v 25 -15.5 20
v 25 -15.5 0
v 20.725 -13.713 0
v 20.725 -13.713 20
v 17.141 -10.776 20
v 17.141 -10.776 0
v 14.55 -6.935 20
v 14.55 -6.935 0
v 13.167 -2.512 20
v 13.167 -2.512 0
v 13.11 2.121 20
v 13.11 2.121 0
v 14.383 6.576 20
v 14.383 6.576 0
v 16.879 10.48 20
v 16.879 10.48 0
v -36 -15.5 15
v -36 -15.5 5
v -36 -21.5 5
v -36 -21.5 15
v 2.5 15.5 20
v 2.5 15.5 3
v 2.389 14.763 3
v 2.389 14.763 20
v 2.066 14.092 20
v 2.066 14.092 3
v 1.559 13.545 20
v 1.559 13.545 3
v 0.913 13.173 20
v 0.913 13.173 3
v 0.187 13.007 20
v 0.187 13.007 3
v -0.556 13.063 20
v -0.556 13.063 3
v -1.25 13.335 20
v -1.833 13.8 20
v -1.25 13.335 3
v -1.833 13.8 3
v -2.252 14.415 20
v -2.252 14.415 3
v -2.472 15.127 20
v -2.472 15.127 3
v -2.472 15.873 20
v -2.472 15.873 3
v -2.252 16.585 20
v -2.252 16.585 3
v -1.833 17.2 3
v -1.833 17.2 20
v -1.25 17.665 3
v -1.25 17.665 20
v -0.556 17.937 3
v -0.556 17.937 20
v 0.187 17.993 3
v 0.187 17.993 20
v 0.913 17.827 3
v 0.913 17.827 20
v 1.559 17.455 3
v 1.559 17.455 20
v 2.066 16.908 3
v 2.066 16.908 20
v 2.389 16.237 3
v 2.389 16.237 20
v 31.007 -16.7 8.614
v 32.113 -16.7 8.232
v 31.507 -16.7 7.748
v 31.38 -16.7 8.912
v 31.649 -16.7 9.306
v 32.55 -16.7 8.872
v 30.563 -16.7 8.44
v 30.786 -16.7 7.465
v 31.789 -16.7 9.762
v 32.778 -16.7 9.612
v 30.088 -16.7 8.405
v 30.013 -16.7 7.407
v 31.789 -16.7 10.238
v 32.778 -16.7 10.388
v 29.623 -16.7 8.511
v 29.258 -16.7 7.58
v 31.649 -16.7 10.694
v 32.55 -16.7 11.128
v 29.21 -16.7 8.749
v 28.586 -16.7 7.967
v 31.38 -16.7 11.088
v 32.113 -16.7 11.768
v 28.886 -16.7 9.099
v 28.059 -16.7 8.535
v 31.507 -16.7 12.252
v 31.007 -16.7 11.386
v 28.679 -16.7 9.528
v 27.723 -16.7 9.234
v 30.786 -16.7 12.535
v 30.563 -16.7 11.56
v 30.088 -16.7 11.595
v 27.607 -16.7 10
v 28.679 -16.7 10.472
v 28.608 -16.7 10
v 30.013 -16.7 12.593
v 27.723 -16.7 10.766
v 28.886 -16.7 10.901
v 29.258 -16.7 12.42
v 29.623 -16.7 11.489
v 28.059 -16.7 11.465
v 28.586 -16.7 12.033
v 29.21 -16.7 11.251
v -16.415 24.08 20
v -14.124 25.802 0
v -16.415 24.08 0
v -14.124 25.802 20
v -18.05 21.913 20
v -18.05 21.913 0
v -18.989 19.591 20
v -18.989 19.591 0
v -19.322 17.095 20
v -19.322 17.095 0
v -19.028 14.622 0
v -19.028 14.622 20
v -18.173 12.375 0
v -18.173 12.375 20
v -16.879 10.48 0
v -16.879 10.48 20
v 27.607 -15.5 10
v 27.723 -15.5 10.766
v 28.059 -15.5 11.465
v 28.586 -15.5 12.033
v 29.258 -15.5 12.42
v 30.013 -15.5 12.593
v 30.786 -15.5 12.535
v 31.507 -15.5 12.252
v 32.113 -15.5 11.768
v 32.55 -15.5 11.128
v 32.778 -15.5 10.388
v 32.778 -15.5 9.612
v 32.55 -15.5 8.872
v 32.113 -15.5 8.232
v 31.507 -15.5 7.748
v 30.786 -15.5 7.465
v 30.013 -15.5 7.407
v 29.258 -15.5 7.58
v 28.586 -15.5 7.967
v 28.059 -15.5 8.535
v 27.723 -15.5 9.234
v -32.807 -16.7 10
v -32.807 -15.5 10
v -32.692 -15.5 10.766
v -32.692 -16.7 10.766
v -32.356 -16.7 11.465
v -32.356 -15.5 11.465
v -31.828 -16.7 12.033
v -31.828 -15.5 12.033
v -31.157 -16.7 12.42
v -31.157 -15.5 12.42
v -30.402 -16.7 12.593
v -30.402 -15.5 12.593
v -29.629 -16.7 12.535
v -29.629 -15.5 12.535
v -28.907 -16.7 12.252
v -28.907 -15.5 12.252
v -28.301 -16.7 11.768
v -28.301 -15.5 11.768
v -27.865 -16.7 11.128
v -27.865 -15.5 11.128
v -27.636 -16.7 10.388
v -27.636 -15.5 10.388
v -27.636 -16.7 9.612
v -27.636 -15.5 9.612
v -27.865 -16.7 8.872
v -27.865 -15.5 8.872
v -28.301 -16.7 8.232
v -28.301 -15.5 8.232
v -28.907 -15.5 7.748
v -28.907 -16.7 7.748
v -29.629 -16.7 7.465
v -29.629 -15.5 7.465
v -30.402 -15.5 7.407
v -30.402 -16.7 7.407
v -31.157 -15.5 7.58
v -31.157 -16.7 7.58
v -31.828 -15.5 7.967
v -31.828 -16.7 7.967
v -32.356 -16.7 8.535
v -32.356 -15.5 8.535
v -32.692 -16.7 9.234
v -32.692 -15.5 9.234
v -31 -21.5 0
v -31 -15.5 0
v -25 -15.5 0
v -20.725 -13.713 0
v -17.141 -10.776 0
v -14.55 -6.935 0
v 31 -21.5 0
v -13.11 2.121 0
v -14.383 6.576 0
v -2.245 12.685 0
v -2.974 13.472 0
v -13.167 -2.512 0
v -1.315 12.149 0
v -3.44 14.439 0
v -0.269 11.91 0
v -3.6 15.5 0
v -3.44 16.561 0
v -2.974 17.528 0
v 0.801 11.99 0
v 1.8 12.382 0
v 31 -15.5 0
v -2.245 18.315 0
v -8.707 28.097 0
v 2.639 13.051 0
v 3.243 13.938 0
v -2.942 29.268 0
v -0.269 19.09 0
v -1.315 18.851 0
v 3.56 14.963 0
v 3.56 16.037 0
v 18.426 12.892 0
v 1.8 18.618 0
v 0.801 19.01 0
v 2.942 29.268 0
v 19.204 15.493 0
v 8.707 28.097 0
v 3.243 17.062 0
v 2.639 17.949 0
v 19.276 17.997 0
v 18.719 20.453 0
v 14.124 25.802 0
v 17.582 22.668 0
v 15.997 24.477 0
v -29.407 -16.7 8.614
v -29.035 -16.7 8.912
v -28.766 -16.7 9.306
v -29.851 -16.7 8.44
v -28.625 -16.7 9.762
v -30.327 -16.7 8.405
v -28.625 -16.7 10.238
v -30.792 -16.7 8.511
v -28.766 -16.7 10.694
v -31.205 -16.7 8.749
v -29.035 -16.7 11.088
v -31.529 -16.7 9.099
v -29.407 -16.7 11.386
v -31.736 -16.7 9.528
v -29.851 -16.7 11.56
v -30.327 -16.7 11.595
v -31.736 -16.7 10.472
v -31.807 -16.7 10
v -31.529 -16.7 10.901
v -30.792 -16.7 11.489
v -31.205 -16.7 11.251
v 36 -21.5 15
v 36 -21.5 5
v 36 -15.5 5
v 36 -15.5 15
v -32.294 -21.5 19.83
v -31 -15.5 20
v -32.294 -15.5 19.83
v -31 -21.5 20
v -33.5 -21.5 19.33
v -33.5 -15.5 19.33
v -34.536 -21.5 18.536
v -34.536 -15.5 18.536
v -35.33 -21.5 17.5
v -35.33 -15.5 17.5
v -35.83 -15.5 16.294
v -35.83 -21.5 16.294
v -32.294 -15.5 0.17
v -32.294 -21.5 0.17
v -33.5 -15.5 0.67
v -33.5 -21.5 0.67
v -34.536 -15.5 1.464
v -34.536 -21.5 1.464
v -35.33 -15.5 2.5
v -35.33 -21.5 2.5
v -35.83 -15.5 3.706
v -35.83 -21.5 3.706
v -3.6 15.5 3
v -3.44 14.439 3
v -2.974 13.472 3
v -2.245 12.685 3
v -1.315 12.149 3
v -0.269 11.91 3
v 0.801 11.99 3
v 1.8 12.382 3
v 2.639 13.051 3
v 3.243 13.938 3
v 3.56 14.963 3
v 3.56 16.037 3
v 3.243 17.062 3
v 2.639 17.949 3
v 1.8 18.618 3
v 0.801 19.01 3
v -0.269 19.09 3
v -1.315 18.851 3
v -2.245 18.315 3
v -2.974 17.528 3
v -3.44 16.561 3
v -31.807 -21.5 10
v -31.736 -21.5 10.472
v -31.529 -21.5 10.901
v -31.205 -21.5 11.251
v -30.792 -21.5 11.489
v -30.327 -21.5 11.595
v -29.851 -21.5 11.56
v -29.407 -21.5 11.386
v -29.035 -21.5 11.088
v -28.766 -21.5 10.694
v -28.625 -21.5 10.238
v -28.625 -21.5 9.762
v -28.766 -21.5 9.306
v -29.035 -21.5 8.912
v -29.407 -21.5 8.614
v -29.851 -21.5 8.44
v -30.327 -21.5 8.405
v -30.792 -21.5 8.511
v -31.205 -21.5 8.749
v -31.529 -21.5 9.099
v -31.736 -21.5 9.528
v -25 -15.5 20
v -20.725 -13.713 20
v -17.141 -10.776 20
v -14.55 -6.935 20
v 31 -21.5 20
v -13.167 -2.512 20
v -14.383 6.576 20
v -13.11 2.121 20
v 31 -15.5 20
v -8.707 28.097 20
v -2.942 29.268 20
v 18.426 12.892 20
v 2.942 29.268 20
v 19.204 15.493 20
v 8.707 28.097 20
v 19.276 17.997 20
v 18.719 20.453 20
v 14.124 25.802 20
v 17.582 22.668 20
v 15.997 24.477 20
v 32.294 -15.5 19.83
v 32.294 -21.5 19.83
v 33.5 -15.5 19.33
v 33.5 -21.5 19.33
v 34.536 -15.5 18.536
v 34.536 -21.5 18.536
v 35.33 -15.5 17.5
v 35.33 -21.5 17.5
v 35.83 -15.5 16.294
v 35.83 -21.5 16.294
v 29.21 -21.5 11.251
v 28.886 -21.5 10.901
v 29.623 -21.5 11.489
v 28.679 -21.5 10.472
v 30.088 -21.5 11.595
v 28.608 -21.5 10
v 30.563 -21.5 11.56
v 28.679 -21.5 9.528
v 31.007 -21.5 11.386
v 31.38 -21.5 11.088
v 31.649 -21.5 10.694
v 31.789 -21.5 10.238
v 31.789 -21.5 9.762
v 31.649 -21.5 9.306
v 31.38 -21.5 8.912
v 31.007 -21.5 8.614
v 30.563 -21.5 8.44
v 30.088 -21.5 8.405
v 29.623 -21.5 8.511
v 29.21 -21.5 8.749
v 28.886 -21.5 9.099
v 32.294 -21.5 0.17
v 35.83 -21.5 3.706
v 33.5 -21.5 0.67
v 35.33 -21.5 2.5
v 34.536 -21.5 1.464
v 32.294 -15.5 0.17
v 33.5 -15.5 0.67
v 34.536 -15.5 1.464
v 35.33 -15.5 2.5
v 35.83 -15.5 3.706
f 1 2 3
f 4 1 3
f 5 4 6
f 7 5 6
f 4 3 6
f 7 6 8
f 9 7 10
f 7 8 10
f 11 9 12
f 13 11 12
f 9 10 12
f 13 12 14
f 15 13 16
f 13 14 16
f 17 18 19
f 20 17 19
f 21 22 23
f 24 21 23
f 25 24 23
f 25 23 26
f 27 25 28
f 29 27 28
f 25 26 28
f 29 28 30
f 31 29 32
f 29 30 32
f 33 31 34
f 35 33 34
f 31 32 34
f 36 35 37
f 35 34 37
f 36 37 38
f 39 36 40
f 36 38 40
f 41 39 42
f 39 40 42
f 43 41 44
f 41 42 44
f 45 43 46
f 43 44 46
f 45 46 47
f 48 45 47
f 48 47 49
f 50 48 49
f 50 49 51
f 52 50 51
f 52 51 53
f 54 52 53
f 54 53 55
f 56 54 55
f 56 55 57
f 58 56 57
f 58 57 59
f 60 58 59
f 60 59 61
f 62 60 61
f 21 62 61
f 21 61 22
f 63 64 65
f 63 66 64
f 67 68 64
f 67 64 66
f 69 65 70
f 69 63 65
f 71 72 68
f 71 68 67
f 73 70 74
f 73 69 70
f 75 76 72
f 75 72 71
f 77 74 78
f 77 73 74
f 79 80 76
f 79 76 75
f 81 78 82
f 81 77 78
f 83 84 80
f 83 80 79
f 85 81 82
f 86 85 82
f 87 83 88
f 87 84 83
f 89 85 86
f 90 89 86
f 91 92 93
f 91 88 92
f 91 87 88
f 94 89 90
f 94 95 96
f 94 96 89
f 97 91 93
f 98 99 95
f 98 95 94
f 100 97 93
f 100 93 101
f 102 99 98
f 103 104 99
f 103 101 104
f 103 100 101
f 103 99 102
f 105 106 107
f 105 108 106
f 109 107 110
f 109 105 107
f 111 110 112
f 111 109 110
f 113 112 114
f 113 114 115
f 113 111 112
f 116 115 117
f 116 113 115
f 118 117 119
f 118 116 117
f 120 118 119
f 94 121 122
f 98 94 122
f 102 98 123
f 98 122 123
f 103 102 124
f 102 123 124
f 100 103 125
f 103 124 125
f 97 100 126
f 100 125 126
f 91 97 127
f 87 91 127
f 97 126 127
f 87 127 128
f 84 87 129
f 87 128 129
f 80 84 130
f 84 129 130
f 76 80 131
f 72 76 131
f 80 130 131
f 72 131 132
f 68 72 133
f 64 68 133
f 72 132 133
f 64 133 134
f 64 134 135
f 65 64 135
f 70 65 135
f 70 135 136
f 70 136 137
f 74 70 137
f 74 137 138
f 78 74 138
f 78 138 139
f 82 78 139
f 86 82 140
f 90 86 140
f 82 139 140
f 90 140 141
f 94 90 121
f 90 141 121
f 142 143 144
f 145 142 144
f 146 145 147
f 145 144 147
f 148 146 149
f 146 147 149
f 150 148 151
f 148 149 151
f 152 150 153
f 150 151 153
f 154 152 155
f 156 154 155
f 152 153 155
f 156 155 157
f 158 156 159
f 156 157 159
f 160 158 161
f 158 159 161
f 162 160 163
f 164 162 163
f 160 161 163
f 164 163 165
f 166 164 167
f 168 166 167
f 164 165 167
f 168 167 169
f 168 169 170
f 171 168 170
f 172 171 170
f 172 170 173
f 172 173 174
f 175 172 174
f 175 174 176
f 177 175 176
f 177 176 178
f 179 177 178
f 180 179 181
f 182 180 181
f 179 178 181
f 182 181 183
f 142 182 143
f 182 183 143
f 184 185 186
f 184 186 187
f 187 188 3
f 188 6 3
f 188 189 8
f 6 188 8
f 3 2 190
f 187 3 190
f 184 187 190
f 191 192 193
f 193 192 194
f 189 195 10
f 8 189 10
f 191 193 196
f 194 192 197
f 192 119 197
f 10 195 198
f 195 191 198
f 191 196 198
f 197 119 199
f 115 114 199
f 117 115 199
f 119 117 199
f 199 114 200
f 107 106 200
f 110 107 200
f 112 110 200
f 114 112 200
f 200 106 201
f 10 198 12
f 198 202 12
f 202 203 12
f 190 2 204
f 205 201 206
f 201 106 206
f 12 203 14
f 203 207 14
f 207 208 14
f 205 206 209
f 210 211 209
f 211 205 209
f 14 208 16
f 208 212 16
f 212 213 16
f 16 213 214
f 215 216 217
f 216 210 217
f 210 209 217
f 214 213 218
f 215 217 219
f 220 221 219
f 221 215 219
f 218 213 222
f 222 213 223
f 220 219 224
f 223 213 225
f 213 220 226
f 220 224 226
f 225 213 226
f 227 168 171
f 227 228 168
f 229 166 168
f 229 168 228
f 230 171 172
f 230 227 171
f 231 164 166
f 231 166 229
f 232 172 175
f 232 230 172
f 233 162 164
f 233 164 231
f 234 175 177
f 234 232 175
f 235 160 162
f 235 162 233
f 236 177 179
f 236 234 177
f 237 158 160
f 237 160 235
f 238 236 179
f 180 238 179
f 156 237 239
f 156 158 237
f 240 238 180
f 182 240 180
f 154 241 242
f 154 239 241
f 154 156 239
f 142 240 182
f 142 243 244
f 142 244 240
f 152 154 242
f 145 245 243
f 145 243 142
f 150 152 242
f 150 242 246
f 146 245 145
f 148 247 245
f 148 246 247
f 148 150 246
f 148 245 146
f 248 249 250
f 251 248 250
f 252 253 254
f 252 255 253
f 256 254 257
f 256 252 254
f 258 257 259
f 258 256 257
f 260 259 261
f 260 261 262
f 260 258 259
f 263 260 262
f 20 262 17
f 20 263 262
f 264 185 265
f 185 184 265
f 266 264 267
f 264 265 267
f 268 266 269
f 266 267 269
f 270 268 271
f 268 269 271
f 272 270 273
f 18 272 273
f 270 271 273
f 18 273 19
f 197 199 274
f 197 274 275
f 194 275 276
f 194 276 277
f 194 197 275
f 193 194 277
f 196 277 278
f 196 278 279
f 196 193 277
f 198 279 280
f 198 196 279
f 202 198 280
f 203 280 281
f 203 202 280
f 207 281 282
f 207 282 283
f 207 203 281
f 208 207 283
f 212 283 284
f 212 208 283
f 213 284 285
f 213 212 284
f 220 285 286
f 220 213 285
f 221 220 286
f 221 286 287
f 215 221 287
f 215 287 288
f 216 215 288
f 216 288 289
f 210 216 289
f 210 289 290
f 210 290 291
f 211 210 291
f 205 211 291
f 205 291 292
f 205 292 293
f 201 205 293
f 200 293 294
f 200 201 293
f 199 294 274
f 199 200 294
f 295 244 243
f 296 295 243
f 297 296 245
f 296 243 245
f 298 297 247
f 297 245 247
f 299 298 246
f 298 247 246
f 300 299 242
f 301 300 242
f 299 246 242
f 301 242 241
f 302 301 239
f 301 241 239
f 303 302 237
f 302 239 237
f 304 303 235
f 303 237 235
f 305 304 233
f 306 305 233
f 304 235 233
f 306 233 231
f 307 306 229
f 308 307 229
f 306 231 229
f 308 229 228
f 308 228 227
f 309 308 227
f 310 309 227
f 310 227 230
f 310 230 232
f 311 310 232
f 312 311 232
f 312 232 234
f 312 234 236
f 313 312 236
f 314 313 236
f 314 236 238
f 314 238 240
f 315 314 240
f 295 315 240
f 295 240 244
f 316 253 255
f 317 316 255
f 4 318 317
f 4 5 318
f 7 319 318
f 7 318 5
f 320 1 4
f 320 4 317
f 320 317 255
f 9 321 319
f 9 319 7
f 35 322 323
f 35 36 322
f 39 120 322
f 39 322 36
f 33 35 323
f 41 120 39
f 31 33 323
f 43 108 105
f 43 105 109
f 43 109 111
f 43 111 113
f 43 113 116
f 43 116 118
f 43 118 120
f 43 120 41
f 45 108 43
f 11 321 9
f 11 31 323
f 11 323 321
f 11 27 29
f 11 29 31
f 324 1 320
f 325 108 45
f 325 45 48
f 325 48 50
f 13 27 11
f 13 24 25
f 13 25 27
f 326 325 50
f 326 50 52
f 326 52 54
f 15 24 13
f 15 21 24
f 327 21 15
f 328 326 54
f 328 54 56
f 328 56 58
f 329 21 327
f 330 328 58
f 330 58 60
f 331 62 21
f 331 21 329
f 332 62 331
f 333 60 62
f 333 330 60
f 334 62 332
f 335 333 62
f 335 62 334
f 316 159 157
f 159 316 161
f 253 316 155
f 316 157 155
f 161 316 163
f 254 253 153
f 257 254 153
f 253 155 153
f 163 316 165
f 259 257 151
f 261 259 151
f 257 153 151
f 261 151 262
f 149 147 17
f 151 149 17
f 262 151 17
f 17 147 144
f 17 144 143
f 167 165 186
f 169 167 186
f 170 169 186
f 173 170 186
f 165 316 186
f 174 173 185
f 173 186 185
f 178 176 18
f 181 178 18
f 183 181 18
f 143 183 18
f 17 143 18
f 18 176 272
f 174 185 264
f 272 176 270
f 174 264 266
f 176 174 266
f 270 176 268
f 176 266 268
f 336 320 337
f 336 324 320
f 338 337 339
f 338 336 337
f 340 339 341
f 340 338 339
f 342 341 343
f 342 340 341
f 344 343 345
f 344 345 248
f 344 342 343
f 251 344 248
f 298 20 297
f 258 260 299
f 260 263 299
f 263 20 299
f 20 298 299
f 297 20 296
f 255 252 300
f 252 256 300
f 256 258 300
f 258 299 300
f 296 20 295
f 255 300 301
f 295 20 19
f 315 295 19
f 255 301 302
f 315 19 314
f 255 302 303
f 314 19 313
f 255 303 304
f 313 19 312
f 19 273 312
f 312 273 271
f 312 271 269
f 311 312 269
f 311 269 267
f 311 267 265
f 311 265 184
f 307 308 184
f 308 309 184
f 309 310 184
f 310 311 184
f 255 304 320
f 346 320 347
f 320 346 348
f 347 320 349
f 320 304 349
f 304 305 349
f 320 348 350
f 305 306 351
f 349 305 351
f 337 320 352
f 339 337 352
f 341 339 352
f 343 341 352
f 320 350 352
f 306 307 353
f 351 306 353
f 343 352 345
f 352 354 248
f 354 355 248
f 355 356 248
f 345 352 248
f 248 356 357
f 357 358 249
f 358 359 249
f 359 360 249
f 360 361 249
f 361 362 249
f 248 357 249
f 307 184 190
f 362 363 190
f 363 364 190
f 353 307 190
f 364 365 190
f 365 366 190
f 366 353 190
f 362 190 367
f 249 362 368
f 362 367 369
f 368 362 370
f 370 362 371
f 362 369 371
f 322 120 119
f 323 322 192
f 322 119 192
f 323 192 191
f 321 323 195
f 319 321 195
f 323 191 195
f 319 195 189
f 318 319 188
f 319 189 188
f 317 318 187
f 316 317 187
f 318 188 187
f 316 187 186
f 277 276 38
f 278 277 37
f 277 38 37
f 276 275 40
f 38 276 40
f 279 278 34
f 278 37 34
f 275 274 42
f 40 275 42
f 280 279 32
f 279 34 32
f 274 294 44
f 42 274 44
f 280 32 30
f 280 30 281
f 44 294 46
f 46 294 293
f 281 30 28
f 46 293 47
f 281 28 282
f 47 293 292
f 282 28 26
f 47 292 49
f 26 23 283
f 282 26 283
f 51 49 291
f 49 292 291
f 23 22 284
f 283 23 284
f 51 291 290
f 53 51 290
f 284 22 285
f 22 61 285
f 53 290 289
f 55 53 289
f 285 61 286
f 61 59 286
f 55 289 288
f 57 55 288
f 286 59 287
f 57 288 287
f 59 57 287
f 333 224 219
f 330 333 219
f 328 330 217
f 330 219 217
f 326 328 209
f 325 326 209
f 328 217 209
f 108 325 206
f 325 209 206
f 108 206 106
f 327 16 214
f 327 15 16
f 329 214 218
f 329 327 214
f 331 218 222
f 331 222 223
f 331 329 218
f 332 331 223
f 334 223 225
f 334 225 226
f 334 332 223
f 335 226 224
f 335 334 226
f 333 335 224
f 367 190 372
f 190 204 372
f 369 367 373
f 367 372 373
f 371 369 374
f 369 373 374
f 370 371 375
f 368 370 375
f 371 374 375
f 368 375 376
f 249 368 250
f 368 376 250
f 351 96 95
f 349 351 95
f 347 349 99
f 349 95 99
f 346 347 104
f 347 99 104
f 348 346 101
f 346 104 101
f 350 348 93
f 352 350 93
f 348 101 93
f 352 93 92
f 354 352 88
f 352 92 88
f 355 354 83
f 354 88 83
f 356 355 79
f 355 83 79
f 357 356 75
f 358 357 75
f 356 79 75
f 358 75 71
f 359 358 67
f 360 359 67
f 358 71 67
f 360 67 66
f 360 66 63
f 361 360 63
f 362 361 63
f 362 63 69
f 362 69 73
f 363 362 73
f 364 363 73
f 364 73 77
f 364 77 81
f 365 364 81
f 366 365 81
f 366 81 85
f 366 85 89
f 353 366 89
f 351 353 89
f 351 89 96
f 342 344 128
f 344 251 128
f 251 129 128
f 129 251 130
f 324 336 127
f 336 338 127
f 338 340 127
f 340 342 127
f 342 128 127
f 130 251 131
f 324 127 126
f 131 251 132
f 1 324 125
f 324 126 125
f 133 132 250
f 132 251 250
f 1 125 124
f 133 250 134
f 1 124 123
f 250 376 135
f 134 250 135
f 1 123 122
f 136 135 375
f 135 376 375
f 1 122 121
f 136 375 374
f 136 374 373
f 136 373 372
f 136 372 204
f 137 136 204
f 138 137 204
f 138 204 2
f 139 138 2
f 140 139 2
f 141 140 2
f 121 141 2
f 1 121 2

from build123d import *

# Parameters (mm, degrees)
F1_DEPTH = 20
F2_R     = 10
F3_R     = 1.599869
F4_DEPTH = 25
F5_R     = 5
F6_DEPTH = 3
F3_R_2   = 2.6
F7_DEPTH = 1.2


with BuildPart() as f1:
    # F0 (on Top) → F1 (new body)
    with BuildSketch(Plane.XY):
        with BuildLine():
            Line((25, 15.5), (3.6, 15.5))
            ThreePointArc((3.6, 15.5), (0, 11.9), (-3.6, 15.5))
            Line((-3.6, 15.5), (-25, 15.5))
            ThreePointArc((-25, 15.5), (-12.968627, 0), (-25, -15.5))
            Line((-25, -15.5), (25, -15.5))
            ThreePointArc((25, -15.5), (12.968627, 0), (25, 15.5))
        make_face()
        with BuildLine():
            ThreePointArc((-2.5, 15.5), (0, 18), (2.5, 15.5))
            Line((2.5, 15.5), (3.6, 15.5))
            ThreePointArc((3.6, 15.5), (0, 19.1), (-3.6, 15.5))
            Line((-3.6, 15.5), (-2.5, 15.5))
        make_face()
        with BuildLine():
            ThreePointArc((-20.07486, -21.5), (-22.736221, -18.663179), (-25, -15.5))
            Line((-25, -15.5), (-36, -15.5))
            Line((-36, -15.5), (-36, -21.5))
            Line((-36, -21.5), (-20.07486, -21.5))
        make_face()
        with BuildLine():
            ThreePointArc((20.07486, -21.5), (22.736221, -18.663179), (25, -15.5))
            Line((25, -15.5), (-25, -15.5))
            ThreePointArc((-25, -15.5), (-22.736221, -18.663179), (-20.07486, -21.5))
            Line((-20.07486, -21.5), (20.07486, -21.5))
        make_face()
        with BuildLine():
            Line((36, -15.5), (25, -15.5))
            ThreePointArc((25, -15.5), (22.736221, -18.663179), (20.07486, -21.5))
            Line((20.07486, -21.5), (36, -21.5))
            Line((36, -21.5), (36, -15.5))
        make_face()
        with BuildLine():
            ThreePointArc((-3.6, 15.5), (0, 19.1), (3.6, 15.5))
            Line((3.6, 15.5), (25, 15.5))
            ThreePointArc((25, 15.5), (0, 29.415132), (-25, 15.5))
            Line((-25, 15.5), (-3.6, 15.5))
        make_face()
        with BuildLine():
            Line((3.6, 15.5), (2.5, 15.5))
            ThreePointArc((2.5, 15.5), (0, 13), (-2.5, 15.5))
            Line((-2.5, 15.5), (-3.6, 15.5))
            ThreePointArc((-3.6, 15.5), (0, 11.9), (3.6, 15.5))
        make_face()
    extrude(amount=F1_DEPTH)

    # F2
    f2_edges = [f1.edges().sort_by_distance(p)[0] for p in [
        (25, 15.5, 10),
        (-25, 15.5, 10),
    ]]
    fillet(f2_edges, radius=F2_R)

    # F3 (on face) → F4 (cut)
    with BuildSketch(Plane(origin=(0, -15.5, 0), x_dir=(-1, 0, 0), z_dir=(0, 1, 0))):
        with Locations((30.207418, 10)):
            Circle(F3_R)
        with Locations((-30.207418, 10)):
            Circle(F3_R)
    extrude(amount=-F4_DEPTH, mode=Mode.SUBTRACT)

    # F5
    f5_edges = [f1.edges().sort_by_distance(p)[0] for p in [
        (-36, -18.5, 20),
        (36, -18.5, 20),
        (36, -18.5, 0),
        (-36, -18.5, 0),
    ]]
    fillet(f5_edges, radius=F5_R)

    # F0 (on Top) → F6 (cut)
    with BuildSketch(Plane.XY):
        with BuildLine():
            ThreePointArc((-2.5, 15.5), (0, 18), (2.5, 15.5))
            Line((2.5, 15.5), (3.6, 15.5))
            ThreePointArc((3.6, 15.5), (0, 19.1), (-3.6, 15.5))
            Line((-3.6, 15.5), (-2.5, 15.5))
        make_face()
        with BuildLine():
            Line((3.6, 15.5), (2.5, 15.5))
            ThreePointArc((2.5, 15.5), (0, 13), (-2.5, 15.5))
            Line((-2.5, 15.5), (-3.6, 15.5))
            ThreePointArc((-3.6, 15.5), (0, 11.9), (3.6, 15.5))
        make_face()
    extrude(amount=F6_DEPTH, mode=Mode.SUBTRACT)

    # F3 (on face) → F7 (cut)
    with BuildSketch(Plane(origin=(0, -15.5, 0), x_dir=(-1, 0, 0), z_dir=(0, 1, 0))):
        with Locations((-30.207418, 10)):
            Circle(F3_R_2)
        with Locations((-30.207418, 10)):
            Circle(F3_R, mode=Mode.SUBTRACT)
        with Locations((30.207418, 10)):
            Circle(F3_R_2)
        with Locations((30.207418, 10)):
            Circle(F3_R, mode=Mode.SUBTRACT)
    extrude(amount=-F7_DEPTH, mode=Mode.SUBTRACT)


solid = f1.part
